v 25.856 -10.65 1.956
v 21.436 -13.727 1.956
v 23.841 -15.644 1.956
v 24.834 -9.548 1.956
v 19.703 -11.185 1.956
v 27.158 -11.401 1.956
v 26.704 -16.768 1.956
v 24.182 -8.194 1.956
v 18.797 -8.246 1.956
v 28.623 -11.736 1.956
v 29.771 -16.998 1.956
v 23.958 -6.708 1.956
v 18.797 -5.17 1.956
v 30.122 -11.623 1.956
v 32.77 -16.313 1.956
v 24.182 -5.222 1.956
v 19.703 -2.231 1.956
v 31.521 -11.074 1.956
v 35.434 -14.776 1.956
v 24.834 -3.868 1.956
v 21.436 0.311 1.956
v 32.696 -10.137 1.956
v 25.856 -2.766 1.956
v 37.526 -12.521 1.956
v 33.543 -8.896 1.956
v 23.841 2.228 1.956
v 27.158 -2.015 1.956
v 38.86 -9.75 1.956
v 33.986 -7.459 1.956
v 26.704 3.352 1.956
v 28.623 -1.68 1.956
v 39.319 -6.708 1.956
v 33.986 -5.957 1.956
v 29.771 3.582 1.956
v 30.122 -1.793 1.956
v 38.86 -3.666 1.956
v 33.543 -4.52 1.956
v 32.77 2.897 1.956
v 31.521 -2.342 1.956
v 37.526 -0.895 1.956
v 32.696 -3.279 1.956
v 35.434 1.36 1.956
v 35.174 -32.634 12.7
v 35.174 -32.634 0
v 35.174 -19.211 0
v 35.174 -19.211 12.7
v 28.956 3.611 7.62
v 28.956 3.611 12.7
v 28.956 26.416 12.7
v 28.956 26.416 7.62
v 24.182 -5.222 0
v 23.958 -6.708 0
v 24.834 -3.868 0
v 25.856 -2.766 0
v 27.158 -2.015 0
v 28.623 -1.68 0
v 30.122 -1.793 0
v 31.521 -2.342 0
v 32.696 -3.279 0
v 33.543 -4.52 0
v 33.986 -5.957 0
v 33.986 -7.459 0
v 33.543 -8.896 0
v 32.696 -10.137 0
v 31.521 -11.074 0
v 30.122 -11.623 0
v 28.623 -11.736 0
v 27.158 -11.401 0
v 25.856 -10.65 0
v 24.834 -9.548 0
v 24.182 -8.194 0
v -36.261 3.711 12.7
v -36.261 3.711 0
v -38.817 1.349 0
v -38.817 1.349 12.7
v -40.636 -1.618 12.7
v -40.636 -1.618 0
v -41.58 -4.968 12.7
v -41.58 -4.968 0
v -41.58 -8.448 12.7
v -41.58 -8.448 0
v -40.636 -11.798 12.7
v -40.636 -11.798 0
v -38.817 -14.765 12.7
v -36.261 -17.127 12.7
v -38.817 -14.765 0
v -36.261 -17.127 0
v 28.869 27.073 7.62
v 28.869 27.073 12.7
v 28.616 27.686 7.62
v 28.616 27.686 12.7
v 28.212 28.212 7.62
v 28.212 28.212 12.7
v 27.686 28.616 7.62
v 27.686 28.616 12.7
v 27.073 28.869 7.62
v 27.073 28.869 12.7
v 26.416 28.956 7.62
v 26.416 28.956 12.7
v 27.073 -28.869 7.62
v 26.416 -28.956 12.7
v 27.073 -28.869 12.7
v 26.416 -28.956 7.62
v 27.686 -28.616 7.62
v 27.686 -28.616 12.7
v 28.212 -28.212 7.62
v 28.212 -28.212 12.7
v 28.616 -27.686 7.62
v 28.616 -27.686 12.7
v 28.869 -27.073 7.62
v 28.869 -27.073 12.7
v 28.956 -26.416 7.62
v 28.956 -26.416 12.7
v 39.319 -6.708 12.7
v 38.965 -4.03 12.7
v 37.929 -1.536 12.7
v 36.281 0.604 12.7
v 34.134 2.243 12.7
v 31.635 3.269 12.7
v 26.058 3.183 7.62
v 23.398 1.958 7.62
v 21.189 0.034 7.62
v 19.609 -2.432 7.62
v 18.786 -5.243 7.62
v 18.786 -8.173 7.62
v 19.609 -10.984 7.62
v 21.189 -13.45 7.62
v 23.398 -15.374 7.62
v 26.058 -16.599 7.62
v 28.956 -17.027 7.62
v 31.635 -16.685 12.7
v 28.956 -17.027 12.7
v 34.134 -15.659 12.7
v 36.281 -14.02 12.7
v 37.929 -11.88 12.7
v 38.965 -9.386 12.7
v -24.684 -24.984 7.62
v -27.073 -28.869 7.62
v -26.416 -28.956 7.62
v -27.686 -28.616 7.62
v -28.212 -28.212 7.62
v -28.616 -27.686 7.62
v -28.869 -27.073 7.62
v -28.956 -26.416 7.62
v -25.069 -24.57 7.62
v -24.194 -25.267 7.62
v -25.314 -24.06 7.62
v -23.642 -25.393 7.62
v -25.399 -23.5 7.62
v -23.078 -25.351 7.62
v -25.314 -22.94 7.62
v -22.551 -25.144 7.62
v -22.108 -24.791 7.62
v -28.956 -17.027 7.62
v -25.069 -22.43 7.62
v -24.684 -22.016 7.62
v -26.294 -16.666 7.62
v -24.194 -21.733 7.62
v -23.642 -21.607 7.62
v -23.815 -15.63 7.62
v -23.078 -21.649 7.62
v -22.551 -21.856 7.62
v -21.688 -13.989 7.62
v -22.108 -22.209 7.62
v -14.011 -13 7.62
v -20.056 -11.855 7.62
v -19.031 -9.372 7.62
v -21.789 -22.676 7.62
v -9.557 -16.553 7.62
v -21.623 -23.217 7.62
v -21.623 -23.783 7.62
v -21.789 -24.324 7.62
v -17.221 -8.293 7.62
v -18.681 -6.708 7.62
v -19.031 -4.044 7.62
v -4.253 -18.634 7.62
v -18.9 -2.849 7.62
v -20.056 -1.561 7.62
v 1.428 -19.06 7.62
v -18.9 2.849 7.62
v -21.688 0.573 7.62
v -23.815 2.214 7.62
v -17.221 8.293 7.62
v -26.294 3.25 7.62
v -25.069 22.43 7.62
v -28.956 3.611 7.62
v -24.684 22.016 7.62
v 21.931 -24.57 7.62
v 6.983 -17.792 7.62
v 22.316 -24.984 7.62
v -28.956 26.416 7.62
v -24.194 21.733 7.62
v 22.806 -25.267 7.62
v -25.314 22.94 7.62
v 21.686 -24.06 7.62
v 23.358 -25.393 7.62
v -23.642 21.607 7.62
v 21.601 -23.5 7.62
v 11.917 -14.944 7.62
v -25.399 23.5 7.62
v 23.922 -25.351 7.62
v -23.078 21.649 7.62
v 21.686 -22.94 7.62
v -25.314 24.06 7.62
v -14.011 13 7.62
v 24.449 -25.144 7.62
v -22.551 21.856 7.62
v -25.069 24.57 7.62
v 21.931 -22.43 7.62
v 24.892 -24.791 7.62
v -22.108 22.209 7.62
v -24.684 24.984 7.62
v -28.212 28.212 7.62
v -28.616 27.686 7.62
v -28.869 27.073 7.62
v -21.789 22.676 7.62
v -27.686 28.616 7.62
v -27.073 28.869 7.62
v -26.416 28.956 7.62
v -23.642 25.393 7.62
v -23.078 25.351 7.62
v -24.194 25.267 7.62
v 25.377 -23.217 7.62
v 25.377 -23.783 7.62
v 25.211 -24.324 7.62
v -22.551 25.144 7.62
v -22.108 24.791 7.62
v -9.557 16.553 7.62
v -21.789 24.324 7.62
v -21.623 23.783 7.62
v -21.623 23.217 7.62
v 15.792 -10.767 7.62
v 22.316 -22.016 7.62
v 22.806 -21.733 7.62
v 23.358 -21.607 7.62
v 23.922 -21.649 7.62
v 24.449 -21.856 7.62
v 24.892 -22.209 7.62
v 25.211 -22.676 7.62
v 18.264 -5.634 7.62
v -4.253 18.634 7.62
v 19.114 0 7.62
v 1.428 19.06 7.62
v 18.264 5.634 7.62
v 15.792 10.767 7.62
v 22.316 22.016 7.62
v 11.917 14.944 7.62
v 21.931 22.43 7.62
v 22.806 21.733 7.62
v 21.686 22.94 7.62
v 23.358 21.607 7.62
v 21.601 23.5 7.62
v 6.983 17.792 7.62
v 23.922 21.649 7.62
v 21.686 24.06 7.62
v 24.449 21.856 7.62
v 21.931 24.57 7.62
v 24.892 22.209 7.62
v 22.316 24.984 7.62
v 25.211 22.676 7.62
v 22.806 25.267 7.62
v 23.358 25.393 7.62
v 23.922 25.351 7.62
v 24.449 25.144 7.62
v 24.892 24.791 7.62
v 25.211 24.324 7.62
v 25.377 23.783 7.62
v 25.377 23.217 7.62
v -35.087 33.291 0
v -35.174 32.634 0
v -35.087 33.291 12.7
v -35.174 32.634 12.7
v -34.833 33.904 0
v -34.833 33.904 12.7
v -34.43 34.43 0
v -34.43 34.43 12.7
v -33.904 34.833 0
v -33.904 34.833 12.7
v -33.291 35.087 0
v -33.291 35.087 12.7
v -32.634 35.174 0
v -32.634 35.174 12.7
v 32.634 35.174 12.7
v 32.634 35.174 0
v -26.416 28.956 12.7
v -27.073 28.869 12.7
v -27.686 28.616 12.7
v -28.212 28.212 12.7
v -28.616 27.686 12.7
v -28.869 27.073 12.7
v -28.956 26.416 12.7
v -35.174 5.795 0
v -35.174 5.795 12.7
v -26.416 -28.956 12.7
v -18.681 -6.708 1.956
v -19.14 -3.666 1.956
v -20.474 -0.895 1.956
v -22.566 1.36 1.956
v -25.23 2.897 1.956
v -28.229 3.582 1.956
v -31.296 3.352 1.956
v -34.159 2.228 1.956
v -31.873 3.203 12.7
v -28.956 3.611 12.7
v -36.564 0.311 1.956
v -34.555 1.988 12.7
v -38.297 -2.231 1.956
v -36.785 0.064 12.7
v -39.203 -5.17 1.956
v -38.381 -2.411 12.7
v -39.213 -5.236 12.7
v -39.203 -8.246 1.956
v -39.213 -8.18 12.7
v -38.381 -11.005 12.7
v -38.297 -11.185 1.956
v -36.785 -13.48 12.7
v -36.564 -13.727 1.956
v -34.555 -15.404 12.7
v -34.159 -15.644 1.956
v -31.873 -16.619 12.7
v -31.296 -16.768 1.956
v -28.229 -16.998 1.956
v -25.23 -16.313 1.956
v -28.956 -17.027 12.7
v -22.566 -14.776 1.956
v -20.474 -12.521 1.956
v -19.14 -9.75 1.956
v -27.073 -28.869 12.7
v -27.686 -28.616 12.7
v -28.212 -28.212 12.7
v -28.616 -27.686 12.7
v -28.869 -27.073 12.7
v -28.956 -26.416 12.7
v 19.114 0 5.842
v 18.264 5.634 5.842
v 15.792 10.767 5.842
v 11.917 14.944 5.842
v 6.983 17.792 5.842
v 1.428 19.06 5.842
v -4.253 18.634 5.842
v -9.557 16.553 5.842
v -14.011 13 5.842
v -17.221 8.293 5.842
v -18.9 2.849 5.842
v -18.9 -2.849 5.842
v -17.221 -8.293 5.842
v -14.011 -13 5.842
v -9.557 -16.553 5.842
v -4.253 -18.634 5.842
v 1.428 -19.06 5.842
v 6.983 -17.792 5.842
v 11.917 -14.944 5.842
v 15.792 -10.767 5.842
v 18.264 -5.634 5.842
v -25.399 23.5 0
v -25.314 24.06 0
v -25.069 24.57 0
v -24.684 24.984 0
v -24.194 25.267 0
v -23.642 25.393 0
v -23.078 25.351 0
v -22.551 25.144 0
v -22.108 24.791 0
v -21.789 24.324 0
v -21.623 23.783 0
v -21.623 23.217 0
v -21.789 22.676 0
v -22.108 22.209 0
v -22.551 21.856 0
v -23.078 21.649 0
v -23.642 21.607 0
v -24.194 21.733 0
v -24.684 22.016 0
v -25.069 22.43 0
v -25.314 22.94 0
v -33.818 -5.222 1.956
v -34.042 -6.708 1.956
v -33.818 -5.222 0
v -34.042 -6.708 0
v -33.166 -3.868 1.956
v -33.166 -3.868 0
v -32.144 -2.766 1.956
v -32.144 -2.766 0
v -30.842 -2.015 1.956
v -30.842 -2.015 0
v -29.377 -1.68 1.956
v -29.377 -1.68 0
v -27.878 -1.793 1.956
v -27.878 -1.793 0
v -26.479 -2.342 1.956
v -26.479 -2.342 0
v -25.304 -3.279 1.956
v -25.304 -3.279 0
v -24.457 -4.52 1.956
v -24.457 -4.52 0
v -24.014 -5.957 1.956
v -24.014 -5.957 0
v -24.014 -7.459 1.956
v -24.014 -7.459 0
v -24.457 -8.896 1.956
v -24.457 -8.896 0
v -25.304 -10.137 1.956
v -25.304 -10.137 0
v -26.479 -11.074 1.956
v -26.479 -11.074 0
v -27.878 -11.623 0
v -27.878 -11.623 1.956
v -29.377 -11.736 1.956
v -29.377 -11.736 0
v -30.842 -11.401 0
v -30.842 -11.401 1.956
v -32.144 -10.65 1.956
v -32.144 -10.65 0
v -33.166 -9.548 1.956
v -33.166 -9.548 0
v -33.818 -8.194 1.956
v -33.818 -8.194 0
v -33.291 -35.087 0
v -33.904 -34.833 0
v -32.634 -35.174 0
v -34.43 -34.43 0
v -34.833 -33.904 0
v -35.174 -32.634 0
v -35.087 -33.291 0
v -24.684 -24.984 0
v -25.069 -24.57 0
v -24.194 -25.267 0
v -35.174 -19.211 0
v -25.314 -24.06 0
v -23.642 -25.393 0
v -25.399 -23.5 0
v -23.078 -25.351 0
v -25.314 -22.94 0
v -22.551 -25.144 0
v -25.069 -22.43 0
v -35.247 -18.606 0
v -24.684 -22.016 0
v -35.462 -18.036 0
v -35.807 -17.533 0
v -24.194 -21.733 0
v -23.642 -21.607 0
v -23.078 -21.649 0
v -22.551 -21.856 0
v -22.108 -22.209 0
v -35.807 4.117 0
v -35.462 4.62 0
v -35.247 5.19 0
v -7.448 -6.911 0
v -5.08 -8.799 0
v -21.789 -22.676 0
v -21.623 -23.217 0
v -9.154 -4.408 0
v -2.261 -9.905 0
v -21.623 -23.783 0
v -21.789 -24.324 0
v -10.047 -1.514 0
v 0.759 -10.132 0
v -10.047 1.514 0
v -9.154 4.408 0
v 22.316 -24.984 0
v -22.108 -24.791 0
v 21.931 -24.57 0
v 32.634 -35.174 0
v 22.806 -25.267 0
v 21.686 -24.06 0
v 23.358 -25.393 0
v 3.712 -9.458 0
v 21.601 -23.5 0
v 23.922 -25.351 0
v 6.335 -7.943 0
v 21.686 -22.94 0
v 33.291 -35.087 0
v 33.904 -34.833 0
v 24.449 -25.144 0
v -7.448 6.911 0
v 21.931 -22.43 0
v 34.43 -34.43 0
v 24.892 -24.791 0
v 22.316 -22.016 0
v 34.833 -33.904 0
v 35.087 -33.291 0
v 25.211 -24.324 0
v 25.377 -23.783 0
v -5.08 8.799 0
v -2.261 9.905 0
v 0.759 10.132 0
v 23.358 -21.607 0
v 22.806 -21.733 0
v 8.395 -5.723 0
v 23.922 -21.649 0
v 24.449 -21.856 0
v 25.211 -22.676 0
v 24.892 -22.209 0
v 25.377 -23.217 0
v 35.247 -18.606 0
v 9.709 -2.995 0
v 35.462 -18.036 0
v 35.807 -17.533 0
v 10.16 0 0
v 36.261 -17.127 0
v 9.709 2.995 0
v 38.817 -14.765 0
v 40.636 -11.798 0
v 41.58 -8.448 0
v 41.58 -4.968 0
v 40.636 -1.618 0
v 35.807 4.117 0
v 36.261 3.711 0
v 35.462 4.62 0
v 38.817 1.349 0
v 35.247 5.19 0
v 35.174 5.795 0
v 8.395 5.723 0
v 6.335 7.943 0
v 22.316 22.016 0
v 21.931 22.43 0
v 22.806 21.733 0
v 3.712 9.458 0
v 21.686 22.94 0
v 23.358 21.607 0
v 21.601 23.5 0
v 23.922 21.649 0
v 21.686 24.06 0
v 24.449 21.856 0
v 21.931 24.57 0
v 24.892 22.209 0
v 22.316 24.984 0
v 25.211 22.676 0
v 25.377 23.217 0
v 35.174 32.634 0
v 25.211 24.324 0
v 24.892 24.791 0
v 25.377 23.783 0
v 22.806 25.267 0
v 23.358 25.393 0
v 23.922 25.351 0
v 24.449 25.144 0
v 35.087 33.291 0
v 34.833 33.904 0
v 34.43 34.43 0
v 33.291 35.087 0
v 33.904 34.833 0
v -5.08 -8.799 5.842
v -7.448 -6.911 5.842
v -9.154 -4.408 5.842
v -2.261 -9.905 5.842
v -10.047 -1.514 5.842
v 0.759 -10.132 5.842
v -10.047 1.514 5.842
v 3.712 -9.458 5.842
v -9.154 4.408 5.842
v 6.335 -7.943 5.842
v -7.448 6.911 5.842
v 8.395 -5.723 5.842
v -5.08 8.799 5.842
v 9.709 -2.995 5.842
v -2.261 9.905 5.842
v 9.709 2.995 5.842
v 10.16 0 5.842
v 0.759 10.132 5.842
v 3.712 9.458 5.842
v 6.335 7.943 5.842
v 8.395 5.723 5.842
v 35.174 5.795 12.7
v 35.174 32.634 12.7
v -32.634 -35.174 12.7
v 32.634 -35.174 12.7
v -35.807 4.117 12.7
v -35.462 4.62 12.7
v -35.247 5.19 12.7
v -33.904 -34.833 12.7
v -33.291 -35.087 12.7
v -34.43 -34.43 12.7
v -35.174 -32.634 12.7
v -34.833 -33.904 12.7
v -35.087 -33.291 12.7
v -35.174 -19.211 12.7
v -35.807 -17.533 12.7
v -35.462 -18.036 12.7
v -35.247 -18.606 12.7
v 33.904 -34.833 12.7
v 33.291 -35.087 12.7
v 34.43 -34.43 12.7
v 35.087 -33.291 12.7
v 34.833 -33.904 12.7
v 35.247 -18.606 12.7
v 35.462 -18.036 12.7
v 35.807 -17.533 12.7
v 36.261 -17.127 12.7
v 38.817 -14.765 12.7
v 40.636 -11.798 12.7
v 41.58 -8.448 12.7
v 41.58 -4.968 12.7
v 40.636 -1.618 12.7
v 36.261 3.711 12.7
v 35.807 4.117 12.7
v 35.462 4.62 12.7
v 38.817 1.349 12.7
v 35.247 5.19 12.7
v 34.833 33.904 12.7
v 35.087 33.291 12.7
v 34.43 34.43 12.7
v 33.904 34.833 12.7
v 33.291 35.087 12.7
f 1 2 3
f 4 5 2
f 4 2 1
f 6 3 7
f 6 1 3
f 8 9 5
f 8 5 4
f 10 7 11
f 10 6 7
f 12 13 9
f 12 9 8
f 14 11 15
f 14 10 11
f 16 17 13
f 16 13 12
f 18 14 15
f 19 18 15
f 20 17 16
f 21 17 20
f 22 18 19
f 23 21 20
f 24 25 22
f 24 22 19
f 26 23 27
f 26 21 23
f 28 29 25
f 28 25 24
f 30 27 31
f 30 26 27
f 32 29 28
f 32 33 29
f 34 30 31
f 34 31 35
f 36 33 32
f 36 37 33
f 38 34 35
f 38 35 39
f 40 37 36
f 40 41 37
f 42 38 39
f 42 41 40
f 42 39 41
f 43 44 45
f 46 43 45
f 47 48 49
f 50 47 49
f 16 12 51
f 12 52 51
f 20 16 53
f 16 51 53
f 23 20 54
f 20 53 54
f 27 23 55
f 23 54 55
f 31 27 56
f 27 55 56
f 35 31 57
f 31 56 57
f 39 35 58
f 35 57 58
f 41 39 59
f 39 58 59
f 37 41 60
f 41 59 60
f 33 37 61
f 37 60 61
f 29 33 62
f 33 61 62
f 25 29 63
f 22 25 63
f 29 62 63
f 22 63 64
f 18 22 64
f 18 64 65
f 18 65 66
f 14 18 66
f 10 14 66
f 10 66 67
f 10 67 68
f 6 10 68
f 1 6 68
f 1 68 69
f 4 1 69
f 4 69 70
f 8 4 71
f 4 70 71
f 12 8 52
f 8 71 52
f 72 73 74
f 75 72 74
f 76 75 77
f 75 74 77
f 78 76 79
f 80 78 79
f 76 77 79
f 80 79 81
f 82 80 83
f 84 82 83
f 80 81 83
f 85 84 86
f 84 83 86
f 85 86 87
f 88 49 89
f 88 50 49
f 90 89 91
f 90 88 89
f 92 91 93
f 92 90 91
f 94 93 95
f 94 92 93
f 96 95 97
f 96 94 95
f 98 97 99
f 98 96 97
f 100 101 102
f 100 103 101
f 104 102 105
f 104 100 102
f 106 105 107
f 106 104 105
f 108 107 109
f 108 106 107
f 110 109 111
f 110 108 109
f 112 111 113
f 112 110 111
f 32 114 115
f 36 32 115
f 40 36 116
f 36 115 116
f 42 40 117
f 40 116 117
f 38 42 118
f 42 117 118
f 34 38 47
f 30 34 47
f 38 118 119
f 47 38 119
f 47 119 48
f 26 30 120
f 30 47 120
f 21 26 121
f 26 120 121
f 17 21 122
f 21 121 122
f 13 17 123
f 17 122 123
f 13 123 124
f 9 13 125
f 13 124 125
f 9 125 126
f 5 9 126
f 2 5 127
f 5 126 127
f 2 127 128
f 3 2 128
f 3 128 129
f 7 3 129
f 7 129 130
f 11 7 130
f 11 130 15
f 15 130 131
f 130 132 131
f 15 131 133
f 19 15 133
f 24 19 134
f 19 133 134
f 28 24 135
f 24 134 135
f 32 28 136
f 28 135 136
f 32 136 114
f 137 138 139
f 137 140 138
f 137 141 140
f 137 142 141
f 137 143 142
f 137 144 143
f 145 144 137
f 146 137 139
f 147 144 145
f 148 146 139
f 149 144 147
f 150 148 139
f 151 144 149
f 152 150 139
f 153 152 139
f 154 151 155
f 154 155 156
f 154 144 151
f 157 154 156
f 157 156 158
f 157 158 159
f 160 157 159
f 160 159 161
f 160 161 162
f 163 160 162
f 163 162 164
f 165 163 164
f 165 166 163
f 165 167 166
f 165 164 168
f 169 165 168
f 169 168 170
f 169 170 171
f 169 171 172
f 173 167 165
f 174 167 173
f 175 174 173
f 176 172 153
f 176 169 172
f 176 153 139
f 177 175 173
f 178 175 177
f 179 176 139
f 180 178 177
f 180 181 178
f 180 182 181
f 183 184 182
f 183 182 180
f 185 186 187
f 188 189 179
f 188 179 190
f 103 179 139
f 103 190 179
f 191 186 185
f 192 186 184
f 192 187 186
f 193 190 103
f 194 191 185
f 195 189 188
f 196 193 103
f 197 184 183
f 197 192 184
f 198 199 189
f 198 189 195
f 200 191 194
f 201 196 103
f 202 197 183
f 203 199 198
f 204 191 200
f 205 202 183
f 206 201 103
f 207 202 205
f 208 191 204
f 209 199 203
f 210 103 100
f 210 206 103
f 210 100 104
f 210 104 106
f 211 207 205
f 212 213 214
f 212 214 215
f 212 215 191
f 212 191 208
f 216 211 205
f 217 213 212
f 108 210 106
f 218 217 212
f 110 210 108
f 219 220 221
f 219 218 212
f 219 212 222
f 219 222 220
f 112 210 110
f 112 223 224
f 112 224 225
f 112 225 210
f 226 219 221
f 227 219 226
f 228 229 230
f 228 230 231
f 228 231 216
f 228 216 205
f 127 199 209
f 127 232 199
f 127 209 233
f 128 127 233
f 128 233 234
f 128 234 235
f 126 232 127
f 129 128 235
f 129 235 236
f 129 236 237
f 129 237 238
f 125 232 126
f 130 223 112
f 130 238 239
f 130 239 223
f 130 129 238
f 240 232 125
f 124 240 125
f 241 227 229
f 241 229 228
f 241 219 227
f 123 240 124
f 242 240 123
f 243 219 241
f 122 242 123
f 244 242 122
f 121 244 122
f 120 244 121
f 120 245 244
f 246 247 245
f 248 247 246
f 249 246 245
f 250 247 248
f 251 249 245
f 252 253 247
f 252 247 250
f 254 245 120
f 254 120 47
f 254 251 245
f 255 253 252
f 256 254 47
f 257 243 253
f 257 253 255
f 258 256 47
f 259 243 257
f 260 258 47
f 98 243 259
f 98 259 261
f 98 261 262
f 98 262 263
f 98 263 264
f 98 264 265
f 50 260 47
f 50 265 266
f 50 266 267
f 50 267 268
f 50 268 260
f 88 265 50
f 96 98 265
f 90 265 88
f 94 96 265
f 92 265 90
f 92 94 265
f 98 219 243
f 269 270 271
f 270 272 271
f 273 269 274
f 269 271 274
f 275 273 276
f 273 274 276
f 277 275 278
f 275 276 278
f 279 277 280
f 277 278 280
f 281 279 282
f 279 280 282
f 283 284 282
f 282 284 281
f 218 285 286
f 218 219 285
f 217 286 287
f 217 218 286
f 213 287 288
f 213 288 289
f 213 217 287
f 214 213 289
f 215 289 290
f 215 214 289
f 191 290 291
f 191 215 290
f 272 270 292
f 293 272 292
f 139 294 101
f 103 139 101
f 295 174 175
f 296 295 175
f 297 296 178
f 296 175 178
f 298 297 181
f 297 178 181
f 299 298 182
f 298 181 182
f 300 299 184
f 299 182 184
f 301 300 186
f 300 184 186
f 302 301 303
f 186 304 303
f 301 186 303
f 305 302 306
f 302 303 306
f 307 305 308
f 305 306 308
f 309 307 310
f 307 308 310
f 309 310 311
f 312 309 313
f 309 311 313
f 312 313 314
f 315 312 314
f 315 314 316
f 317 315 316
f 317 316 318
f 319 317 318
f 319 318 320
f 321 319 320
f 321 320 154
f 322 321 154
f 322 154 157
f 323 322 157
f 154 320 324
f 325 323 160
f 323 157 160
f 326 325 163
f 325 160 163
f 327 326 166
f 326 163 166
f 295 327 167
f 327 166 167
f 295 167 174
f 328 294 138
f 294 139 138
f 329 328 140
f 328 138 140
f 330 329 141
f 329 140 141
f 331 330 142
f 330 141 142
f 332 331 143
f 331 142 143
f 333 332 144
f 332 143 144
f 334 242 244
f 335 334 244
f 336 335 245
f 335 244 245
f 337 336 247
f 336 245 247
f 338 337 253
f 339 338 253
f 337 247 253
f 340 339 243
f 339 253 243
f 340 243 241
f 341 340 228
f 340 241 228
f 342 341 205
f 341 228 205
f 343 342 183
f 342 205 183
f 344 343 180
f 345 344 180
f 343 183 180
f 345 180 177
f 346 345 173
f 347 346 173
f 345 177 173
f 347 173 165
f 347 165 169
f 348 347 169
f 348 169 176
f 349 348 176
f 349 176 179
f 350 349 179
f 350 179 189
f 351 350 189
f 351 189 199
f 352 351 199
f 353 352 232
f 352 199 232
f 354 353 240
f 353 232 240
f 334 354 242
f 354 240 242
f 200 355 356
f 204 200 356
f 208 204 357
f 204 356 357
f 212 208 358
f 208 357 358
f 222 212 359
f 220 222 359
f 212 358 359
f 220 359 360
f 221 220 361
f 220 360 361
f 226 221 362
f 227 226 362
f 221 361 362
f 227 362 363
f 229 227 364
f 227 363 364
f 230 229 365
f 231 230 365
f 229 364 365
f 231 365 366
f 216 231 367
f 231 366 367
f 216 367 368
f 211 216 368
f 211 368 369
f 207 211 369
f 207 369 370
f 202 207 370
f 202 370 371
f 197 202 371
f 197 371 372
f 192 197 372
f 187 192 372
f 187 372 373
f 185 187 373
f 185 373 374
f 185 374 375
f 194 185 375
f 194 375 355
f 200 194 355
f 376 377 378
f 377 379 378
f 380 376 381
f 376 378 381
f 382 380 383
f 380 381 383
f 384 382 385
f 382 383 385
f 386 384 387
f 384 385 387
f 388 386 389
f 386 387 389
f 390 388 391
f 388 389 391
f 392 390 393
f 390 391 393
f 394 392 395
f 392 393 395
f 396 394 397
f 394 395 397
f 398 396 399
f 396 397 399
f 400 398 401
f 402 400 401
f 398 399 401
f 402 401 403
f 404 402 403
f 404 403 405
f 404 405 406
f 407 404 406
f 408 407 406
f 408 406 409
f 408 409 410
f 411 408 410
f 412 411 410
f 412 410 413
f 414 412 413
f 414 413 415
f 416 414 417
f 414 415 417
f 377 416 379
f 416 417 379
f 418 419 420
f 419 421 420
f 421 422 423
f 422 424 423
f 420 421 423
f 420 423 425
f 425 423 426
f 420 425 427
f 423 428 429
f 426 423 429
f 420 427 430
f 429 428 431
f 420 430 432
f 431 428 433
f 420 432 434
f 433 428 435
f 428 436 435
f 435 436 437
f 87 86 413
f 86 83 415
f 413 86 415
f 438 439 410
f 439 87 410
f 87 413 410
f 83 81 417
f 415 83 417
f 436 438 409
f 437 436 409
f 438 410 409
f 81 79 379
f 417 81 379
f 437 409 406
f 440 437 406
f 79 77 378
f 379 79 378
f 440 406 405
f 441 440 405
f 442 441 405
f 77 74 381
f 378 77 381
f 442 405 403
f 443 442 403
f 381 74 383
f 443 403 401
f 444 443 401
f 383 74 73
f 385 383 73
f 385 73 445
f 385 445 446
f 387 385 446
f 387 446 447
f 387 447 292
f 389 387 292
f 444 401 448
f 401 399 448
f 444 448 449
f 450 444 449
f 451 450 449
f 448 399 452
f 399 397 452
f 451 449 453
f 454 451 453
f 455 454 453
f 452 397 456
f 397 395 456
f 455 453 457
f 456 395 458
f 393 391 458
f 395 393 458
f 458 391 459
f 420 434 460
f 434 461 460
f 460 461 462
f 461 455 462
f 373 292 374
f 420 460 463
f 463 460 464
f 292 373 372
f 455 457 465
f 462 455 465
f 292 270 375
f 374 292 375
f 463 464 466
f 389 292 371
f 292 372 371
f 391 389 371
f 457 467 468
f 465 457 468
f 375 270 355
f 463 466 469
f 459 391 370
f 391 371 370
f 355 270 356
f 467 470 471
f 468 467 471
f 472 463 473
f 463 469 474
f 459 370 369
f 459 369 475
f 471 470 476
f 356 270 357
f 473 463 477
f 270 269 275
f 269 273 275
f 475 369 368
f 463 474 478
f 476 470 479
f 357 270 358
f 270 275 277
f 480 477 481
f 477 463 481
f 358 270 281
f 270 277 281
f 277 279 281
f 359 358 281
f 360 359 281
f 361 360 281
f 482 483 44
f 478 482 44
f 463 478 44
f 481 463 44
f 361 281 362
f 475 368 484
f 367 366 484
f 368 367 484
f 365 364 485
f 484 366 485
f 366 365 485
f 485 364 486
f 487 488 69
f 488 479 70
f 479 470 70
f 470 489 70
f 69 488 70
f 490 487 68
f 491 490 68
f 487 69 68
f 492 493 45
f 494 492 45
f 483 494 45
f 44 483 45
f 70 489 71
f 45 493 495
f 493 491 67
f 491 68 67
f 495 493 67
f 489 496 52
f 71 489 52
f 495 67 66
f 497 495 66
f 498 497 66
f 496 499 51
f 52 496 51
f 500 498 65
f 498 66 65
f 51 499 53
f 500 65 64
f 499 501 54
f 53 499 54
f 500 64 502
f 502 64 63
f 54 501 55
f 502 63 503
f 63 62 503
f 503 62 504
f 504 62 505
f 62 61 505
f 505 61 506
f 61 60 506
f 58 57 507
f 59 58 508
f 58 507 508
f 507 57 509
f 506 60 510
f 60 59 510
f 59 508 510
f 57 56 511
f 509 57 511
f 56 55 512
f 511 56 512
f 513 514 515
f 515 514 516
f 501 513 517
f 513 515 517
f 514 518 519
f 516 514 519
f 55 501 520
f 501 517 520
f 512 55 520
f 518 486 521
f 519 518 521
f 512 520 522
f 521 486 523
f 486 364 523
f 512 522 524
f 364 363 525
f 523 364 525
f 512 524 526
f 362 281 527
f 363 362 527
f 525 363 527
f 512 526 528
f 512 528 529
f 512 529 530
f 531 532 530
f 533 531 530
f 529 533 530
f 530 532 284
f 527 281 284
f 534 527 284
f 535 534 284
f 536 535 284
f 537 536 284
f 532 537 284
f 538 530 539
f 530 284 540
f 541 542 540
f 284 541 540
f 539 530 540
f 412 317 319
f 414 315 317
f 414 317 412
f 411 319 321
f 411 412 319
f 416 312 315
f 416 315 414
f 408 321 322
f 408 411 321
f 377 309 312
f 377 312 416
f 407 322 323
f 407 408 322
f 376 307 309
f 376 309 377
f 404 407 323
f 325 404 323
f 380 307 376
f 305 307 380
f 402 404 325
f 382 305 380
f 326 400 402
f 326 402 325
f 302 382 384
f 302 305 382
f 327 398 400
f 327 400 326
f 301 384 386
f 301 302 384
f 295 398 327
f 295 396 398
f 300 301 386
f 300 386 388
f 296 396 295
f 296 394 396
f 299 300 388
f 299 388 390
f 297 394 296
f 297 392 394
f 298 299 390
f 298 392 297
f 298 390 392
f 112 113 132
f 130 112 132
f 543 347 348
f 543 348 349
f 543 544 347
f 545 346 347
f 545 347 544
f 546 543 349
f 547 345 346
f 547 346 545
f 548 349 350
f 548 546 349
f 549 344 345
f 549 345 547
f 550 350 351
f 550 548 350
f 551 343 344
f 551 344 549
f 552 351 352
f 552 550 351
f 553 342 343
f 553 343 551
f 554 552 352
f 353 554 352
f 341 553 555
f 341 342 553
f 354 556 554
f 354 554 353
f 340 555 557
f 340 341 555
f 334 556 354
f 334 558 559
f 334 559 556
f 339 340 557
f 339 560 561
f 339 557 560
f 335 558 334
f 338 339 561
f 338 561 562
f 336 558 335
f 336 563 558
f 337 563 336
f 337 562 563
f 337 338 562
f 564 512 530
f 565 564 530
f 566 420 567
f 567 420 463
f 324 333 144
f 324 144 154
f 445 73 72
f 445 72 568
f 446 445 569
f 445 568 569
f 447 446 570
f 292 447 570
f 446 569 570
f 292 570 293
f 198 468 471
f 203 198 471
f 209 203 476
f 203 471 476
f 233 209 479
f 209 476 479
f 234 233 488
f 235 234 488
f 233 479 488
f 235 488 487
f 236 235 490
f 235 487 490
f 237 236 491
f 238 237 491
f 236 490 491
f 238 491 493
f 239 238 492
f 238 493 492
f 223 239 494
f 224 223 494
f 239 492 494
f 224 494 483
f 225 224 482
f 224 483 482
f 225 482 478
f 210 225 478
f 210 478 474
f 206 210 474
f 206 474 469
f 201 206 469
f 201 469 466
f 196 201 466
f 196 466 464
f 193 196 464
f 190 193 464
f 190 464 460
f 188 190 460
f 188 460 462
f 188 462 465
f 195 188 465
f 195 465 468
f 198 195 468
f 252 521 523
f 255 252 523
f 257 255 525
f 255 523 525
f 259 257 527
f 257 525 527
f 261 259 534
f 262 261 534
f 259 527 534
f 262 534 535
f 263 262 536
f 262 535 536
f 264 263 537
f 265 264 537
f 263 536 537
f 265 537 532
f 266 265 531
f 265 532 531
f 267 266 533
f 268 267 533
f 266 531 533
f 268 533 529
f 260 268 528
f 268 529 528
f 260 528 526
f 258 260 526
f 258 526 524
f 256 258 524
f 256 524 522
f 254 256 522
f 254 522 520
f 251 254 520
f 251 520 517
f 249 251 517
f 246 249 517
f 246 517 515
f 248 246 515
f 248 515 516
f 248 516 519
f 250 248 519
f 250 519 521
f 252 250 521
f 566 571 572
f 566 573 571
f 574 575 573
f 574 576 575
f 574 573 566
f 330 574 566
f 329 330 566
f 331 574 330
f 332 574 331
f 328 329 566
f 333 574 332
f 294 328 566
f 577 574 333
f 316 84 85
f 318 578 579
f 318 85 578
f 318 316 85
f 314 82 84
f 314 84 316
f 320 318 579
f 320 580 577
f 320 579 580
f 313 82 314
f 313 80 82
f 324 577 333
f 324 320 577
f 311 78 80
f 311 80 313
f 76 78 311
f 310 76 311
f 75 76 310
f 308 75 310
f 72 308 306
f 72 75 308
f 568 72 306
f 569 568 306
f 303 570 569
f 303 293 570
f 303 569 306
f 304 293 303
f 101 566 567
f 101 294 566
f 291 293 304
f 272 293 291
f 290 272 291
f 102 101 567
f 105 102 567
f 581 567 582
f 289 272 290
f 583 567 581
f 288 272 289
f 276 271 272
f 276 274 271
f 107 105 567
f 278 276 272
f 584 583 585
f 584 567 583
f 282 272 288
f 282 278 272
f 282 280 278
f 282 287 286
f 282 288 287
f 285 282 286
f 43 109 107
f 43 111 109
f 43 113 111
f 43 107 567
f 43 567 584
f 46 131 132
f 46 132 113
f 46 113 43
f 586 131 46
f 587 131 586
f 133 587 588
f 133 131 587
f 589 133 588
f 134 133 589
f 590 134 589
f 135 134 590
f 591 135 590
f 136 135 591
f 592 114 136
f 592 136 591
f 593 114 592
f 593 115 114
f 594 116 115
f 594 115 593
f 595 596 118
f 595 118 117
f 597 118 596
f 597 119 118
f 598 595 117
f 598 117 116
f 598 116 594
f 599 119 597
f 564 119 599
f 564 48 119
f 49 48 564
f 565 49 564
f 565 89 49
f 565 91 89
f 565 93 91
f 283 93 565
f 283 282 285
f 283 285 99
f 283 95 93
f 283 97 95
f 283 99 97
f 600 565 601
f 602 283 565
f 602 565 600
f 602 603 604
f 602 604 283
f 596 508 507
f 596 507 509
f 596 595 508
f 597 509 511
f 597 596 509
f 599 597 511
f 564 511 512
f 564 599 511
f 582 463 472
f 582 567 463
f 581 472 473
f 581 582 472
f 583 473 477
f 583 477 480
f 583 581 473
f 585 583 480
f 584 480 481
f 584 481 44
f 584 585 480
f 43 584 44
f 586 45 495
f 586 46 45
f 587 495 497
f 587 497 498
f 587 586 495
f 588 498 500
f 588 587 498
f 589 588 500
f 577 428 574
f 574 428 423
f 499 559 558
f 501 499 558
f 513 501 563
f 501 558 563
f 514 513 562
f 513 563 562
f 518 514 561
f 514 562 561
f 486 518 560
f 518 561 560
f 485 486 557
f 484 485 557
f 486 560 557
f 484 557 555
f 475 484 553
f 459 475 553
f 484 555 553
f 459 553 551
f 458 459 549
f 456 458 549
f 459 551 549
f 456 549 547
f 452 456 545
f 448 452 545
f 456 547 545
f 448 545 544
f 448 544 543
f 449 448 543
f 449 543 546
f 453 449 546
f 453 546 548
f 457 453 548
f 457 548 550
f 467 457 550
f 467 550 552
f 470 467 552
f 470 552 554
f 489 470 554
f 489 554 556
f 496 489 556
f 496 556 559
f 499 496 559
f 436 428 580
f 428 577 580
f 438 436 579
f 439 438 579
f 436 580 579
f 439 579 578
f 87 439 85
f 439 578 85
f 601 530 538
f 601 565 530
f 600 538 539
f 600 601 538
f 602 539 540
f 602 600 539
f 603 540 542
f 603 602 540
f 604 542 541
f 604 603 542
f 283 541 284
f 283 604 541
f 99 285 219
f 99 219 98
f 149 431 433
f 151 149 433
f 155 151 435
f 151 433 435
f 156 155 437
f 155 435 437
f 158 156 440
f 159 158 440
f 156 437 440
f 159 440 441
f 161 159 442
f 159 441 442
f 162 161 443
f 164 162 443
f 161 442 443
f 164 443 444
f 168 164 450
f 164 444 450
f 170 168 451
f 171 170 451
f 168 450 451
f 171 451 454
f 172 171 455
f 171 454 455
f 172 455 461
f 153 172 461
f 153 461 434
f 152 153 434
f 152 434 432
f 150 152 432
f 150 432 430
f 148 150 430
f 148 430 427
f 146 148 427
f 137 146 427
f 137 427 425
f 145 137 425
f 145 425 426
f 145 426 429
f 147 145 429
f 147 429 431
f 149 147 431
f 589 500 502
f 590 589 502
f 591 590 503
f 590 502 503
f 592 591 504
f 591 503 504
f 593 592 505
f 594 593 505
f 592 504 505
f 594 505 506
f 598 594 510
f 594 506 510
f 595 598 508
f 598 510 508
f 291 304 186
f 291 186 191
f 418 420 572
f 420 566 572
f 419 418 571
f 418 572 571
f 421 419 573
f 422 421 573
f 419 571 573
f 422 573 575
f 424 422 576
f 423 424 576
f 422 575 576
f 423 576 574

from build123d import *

# Parameters (mm, degrees)
BOSS_EXTRUDE1_DEPTH                                  = 12.7
SKETCH16_R                                           = 10.16
CUT_EXTRUDE3_DEPTH                                   = 1
CUT_EXTRUDE3_DEPTH_BACK                              = 13.7
SKETCH17_W                                           = 57.912
SKETCH17_H                                           = 57.912
CUT_EXTRUDE4_DEPTH                                   = 5.08
CBORE_FOR_3_8_BINDING_HEAD_MACHINE_SCREW_D           = 10.0838
CBORE_FOR_3_8_BINDING_HEAD_MACHINE_SCREW_CBORE_D     = 20.6375
CBORE_FOR_3_8_BINDING_HEAD_MACHINE_SCREW_CBORE_DEPTH = 10.7442
FILLET3_R                                            = 2.54
TAP_DRILL_FOR_10_24_TAP1_D                           = 3.7973
SKETCH24_R                                           = 19.1135
CUT_EXTRUDE5_DEPTH                                   = 1.778
FILLET4_R                                            = 2.54


with BuildPart() as part:
    # Sketch1 → Boss-Extrude1 (new body)
    with BuildSketch(Plane.XY):
        with BuildLine():
            Line((-35.173578353, -35.173578353), (35.173578353, -35.173578353))
            Line((35.173578353, -35.173578353), (35.173578353, -17.806510321))
            ThreePointArc((35.173578353, -17.806510321), (41.7, -6.708000046), (35.173578353, 4.390510229))
            Line((35.173578353, 4.390510229), (35.173578353, 35.173578353))
            Line((35.173578353, 35.173578353), (-35.173578353, 35.173578353))
            Line((-35.173578353, 35.173578353), (-35.173578353, 4.390510229))
            ThreePointArc((-35.173578353, 4.390510229), (-41.7, -6.708000046), (-35.173578353, -17.806510321))
            Line((-35.173578353, -17.806510321), (-35.173578353, -35.173578353))
        make_face()
    extrude(amount=BOSS_EXTRUDE1_DEPTH)

    # Sketch16 → Cut-Extrude3 (cut, two sides)
    with BuildSketch(Plane.XY.offset(12.7)) as cut_extrude3_sk:
        Circle(SKETCH16_R)
    extrude(amount=CUT_EXTRUDE3_DEPTH, mode=Mode.SUBTRACT)
    extrude(cut_extrude3_sk.sketch, amount=-CUT_EXTRUDE3_DEPTH_BACK, mode=Mode.SUBTRACT)

    # Sketch17 → Cut-Extrude4 (cut)
    with BuildSketch(Plane.XY.offset(12.7)):
        Rectangle(SKETCH17_W, SKETCH17_H)
    extrude(amount=-CUT_EXTRUDE4_DEPTH, mode=Mode.SUBTRACT)

    # CBORE for 3/8 Binding Head Machine Screw1 (through all)
    with Locations(Plane.XY.offset(12.7)):
        with Locations((-29, -6.708000046), (29, -6.708000046)):
            CounterBoreHole(CBORE_FOR_3_8_BINDING_HEAD_MACHINE_SCREW_D / 2, CBORE_FOR_3_8_BINDING_HEAD_MACHINE_SCREW_CBORE_D / 2, CBORE_FOR_3_8_BINDING_HEAD_MACHINE_SCREW_CBORE_DEPTH)

    # Fillet3
    fillet3_edges = [part.edges().sort_by_distance(p)[0] for p in [
        (35.173578353, -35.173578353, 6.35),
        (-35.173578353, -35.173578353, 6.35),
        (-35.173578353, 35.173578353, 6.35),
        (35.173578353, 35.173578353, 6.35),
        (28.956, 28.956, 10.16),
        (28.956, -28.956, 10.16),
        (-28.956, -28.956, 10.16),
        (-28.956, 28.956, 10.16),
    ]]
    fillet(fillet3_edges, radius=FILLET3_R)

    # Tap Drill for #10-24 Tap1 (through all)
    with Locations(Plane.XY.offset(7.62)):
        with Locations((-23.5, -23.5), (-23.5, 23.5), (23.5, 23.5), (23.5, -23.5)):
            Hole(TAP_DRILL_FOR_10_24_TAP1_D / 2)

    # Sketch24 → Cut-Extrude5 (cut)
    with BuildSketch(Plane.XY.offset(7.62)):
        Circle(SKETCH24_R)
    extrude(amount=-CUT_EXTRUDE5_DEPTH, mode=Mode.SUBTRACT)

    # Fillet4
    fillet4_edges = [part.edges().sort_by_distance(p)[0] for p in [
        (35.173578353, 4.390510229, 6.35),
        (35.173578353, -17.806510321, 6.35),
        (-35.173578353, -17.806510321, 6.35),
        (-35.173578353, 4.390510229, 6.35),
    ]]
    fillet(fillet4_edges, radius=FILLET4_R)


solid = part.part
